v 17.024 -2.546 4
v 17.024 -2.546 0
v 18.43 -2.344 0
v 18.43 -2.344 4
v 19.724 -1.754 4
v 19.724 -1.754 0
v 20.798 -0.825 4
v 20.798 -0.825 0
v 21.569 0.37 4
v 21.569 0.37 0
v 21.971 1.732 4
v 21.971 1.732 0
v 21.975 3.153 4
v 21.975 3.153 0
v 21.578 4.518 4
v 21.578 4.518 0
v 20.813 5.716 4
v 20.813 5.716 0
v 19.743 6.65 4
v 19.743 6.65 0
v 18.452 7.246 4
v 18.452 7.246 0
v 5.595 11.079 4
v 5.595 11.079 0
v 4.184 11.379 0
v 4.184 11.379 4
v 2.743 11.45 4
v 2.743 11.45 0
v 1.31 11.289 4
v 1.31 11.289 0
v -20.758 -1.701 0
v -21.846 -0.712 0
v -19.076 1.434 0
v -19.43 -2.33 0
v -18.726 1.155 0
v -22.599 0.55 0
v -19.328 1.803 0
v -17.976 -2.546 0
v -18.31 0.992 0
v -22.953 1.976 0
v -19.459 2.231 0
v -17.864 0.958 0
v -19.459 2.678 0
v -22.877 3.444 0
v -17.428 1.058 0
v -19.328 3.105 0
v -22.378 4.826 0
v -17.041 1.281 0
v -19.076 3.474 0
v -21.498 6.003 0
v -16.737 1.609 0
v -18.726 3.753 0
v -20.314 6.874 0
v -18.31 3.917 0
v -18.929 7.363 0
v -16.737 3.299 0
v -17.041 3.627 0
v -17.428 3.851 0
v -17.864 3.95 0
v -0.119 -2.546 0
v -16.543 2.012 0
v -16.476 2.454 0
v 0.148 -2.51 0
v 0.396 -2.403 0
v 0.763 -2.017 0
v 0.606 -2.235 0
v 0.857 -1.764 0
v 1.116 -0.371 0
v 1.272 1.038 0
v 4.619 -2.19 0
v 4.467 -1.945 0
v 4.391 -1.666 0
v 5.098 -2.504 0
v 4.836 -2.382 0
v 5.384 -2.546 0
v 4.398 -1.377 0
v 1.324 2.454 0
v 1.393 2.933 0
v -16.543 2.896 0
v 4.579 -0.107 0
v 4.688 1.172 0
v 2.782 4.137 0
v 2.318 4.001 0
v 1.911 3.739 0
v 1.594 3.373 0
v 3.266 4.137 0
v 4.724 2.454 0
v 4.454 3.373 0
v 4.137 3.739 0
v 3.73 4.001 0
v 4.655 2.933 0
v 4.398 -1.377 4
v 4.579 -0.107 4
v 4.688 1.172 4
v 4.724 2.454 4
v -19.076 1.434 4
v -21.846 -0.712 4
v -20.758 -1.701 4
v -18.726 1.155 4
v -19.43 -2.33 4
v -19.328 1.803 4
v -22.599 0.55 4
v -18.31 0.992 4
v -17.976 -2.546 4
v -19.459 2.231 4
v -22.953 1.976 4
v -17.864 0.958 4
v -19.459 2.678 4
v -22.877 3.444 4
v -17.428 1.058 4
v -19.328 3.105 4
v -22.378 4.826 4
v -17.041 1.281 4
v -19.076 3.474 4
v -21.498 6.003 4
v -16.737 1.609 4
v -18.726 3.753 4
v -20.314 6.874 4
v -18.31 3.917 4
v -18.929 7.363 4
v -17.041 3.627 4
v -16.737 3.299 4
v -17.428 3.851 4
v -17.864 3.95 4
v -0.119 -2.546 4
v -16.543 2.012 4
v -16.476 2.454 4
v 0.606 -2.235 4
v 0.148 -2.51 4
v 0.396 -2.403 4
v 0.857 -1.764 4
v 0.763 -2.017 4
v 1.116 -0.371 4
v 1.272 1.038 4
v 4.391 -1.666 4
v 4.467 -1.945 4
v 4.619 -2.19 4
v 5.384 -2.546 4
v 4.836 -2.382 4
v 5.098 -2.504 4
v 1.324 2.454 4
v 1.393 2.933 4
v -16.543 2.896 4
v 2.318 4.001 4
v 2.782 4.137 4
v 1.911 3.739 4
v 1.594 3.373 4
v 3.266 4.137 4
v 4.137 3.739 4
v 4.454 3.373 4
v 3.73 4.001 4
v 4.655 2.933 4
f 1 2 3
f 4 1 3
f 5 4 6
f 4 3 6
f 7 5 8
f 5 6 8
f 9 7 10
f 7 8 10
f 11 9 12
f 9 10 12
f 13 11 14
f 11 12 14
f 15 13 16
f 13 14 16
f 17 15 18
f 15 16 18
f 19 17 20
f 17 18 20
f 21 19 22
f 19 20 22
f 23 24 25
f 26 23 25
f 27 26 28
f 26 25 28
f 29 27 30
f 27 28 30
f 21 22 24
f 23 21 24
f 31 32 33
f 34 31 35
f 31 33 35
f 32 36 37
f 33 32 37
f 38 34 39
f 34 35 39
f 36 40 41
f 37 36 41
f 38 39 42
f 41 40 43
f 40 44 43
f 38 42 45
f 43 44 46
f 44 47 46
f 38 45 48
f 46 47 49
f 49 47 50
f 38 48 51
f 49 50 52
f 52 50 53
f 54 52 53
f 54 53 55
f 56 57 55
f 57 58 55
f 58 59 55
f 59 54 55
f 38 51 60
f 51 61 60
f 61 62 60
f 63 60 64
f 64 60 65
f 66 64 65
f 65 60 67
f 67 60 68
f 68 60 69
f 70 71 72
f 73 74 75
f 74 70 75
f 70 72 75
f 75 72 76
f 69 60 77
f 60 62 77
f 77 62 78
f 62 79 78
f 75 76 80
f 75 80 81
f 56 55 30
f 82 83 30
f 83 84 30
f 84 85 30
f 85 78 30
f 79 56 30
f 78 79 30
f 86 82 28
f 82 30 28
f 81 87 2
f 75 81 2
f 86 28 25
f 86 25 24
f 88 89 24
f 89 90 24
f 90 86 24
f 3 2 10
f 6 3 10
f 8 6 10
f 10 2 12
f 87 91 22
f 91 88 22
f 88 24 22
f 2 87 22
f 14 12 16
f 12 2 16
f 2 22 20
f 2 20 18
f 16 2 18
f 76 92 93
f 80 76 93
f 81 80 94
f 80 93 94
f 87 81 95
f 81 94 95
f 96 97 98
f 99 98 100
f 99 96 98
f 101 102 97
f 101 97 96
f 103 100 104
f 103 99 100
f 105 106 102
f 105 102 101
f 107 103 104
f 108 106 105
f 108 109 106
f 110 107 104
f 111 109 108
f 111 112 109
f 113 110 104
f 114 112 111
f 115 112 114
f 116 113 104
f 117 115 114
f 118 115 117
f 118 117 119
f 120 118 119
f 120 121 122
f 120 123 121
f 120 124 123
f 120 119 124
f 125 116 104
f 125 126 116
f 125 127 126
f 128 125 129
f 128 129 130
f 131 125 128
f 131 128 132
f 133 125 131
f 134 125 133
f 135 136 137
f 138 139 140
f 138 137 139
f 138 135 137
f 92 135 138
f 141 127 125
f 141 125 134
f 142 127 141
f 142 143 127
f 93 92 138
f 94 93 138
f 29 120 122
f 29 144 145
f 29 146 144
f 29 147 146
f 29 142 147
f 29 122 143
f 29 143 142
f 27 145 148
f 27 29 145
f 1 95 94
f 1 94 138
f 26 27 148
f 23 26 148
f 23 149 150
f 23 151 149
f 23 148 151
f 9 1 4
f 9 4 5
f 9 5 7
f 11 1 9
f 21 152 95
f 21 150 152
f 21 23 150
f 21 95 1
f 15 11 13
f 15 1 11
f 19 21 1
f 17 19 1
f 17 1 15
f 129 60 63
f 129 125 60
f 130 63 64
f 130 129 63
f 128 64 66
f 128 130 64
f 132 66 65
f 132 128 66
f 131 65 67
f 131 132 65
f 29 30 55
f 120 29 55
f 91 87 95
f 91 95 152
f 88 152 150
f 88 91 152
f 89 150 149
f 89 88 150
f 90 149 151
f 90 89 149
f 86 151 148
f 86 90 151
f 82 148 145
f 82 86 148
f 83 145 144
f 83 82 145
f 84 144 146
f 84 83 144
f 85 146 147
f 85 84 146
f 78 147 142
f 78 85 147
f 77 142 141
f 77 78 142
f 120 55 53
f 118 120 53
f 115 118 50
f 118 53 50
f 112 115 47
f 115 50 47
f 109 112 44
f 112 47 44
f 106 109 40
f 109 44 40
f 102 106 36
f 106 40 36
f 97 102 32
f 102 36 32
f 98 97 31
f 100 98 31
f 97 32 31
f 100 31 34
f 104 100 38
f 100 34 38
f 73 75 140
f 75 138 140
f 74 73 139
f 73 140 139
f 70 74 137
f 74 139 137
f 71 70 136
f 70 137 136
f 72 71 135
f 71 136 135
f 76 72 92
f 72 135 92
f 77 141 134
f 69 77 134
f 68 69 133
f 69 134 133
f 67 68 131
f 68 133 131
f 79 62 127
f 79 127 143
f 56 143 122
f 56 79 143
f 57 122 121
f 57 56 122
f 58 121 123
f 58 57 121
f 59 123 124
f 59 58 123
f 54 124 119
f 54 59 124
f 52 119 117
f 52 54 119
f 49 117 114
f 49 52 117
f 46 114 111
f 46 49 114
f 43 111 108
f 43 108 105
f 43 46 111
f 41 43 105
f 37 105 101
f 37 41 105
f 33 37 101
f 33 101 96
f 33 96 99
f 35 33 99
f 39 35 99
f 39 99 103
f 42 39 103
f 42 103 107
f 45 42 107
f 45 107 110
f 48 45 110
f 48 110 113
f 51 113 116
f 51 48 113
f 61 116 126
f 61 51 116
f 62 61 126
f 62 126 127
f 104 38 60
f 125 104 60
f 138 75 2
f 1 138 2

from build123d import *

# Parameters (mm, degrees)
SKETCH1_R           = 1.5
SKETCH1_R_2         = 1.7
BOSS_EXTRUDE1_DEPTH = 4
CUT_EXTRUDE1_DEPTH  = 5
FILLET1_R           = 1


with BuildPart() as part:
    # Sketch1 → Boss-Extrude1 (new body)
    with BuildSketch(Plane.XY):
        with BuildLine():
            Line((-17.976190476, -2.545770461), (17.023809524, -2.545770461))
            ThreePointArc((17.023809524, -2.545770461), (21.971428708, 1.732381628), (18.452380952, 7.245803777))
            Line((18.452380952, 7.245803777), (5.595238095, 11.079063167))
            ThreePointArc((5.595238095, 11.079063167), (3.465102786, 11.443404154), (1.30952381, 11.28945588))
            Line((1.30952381, 11.28945588), (-18.928571429, 7.362688617))
            ThreePointArc((-18.928571429, 7.362688617), (-22.953252631, 1.975844438), (-17.976190476, -2.545770461))
        make_face()
        with Locations((-17.976190476, 2.454229539)):
            Circle(SKETCH1_R, mode=Mode.SUBTRACT)
        with Locations((3.023809524, 2.454229539)):
            Circle(SKETCH1_R_2, mode=Mode.SUBTRACT)
    extrude(amount=BOSS_EXTRUDE1_DEPTH)

    # Sketch2 → Cut-Extrude1 (cut, through all)
    with BuildSketch(Plane.XY.offset(4)):
        with BuildLine():
            Line((-1.835195666, -8.126804745), (2.106929637, -8.126804745))
            ThreePointArc((2.106929637, -8.126804745), (4.059880255, -2.995686673), (4.723809524, 2.454229539))
            ThreePointArc((4.723809524, 2.454229539), (3.023809524, 4.154229539), (1.323809524, 2.454229539))
            ThreePointArc((1.323809524, 2.454229539), (0.517202937, -3.067038438), (-1.835195666, -8.126804745))
        make_face()
    extrude(amount=-CUT_EXTRUDE1_DEPTH, mode=Mode.SUBTRACT)

    # Fillet1
    fillet1_edges = [part.edges().sort_by_distance(p)[0] for p in [
        (4.166302608, -2.545770461, 2),
        (0.664893183, -2.545770461, 2),
    ]]
    fillet(fillet1_edges, radius=FILLET1_R)


solid = part.part
